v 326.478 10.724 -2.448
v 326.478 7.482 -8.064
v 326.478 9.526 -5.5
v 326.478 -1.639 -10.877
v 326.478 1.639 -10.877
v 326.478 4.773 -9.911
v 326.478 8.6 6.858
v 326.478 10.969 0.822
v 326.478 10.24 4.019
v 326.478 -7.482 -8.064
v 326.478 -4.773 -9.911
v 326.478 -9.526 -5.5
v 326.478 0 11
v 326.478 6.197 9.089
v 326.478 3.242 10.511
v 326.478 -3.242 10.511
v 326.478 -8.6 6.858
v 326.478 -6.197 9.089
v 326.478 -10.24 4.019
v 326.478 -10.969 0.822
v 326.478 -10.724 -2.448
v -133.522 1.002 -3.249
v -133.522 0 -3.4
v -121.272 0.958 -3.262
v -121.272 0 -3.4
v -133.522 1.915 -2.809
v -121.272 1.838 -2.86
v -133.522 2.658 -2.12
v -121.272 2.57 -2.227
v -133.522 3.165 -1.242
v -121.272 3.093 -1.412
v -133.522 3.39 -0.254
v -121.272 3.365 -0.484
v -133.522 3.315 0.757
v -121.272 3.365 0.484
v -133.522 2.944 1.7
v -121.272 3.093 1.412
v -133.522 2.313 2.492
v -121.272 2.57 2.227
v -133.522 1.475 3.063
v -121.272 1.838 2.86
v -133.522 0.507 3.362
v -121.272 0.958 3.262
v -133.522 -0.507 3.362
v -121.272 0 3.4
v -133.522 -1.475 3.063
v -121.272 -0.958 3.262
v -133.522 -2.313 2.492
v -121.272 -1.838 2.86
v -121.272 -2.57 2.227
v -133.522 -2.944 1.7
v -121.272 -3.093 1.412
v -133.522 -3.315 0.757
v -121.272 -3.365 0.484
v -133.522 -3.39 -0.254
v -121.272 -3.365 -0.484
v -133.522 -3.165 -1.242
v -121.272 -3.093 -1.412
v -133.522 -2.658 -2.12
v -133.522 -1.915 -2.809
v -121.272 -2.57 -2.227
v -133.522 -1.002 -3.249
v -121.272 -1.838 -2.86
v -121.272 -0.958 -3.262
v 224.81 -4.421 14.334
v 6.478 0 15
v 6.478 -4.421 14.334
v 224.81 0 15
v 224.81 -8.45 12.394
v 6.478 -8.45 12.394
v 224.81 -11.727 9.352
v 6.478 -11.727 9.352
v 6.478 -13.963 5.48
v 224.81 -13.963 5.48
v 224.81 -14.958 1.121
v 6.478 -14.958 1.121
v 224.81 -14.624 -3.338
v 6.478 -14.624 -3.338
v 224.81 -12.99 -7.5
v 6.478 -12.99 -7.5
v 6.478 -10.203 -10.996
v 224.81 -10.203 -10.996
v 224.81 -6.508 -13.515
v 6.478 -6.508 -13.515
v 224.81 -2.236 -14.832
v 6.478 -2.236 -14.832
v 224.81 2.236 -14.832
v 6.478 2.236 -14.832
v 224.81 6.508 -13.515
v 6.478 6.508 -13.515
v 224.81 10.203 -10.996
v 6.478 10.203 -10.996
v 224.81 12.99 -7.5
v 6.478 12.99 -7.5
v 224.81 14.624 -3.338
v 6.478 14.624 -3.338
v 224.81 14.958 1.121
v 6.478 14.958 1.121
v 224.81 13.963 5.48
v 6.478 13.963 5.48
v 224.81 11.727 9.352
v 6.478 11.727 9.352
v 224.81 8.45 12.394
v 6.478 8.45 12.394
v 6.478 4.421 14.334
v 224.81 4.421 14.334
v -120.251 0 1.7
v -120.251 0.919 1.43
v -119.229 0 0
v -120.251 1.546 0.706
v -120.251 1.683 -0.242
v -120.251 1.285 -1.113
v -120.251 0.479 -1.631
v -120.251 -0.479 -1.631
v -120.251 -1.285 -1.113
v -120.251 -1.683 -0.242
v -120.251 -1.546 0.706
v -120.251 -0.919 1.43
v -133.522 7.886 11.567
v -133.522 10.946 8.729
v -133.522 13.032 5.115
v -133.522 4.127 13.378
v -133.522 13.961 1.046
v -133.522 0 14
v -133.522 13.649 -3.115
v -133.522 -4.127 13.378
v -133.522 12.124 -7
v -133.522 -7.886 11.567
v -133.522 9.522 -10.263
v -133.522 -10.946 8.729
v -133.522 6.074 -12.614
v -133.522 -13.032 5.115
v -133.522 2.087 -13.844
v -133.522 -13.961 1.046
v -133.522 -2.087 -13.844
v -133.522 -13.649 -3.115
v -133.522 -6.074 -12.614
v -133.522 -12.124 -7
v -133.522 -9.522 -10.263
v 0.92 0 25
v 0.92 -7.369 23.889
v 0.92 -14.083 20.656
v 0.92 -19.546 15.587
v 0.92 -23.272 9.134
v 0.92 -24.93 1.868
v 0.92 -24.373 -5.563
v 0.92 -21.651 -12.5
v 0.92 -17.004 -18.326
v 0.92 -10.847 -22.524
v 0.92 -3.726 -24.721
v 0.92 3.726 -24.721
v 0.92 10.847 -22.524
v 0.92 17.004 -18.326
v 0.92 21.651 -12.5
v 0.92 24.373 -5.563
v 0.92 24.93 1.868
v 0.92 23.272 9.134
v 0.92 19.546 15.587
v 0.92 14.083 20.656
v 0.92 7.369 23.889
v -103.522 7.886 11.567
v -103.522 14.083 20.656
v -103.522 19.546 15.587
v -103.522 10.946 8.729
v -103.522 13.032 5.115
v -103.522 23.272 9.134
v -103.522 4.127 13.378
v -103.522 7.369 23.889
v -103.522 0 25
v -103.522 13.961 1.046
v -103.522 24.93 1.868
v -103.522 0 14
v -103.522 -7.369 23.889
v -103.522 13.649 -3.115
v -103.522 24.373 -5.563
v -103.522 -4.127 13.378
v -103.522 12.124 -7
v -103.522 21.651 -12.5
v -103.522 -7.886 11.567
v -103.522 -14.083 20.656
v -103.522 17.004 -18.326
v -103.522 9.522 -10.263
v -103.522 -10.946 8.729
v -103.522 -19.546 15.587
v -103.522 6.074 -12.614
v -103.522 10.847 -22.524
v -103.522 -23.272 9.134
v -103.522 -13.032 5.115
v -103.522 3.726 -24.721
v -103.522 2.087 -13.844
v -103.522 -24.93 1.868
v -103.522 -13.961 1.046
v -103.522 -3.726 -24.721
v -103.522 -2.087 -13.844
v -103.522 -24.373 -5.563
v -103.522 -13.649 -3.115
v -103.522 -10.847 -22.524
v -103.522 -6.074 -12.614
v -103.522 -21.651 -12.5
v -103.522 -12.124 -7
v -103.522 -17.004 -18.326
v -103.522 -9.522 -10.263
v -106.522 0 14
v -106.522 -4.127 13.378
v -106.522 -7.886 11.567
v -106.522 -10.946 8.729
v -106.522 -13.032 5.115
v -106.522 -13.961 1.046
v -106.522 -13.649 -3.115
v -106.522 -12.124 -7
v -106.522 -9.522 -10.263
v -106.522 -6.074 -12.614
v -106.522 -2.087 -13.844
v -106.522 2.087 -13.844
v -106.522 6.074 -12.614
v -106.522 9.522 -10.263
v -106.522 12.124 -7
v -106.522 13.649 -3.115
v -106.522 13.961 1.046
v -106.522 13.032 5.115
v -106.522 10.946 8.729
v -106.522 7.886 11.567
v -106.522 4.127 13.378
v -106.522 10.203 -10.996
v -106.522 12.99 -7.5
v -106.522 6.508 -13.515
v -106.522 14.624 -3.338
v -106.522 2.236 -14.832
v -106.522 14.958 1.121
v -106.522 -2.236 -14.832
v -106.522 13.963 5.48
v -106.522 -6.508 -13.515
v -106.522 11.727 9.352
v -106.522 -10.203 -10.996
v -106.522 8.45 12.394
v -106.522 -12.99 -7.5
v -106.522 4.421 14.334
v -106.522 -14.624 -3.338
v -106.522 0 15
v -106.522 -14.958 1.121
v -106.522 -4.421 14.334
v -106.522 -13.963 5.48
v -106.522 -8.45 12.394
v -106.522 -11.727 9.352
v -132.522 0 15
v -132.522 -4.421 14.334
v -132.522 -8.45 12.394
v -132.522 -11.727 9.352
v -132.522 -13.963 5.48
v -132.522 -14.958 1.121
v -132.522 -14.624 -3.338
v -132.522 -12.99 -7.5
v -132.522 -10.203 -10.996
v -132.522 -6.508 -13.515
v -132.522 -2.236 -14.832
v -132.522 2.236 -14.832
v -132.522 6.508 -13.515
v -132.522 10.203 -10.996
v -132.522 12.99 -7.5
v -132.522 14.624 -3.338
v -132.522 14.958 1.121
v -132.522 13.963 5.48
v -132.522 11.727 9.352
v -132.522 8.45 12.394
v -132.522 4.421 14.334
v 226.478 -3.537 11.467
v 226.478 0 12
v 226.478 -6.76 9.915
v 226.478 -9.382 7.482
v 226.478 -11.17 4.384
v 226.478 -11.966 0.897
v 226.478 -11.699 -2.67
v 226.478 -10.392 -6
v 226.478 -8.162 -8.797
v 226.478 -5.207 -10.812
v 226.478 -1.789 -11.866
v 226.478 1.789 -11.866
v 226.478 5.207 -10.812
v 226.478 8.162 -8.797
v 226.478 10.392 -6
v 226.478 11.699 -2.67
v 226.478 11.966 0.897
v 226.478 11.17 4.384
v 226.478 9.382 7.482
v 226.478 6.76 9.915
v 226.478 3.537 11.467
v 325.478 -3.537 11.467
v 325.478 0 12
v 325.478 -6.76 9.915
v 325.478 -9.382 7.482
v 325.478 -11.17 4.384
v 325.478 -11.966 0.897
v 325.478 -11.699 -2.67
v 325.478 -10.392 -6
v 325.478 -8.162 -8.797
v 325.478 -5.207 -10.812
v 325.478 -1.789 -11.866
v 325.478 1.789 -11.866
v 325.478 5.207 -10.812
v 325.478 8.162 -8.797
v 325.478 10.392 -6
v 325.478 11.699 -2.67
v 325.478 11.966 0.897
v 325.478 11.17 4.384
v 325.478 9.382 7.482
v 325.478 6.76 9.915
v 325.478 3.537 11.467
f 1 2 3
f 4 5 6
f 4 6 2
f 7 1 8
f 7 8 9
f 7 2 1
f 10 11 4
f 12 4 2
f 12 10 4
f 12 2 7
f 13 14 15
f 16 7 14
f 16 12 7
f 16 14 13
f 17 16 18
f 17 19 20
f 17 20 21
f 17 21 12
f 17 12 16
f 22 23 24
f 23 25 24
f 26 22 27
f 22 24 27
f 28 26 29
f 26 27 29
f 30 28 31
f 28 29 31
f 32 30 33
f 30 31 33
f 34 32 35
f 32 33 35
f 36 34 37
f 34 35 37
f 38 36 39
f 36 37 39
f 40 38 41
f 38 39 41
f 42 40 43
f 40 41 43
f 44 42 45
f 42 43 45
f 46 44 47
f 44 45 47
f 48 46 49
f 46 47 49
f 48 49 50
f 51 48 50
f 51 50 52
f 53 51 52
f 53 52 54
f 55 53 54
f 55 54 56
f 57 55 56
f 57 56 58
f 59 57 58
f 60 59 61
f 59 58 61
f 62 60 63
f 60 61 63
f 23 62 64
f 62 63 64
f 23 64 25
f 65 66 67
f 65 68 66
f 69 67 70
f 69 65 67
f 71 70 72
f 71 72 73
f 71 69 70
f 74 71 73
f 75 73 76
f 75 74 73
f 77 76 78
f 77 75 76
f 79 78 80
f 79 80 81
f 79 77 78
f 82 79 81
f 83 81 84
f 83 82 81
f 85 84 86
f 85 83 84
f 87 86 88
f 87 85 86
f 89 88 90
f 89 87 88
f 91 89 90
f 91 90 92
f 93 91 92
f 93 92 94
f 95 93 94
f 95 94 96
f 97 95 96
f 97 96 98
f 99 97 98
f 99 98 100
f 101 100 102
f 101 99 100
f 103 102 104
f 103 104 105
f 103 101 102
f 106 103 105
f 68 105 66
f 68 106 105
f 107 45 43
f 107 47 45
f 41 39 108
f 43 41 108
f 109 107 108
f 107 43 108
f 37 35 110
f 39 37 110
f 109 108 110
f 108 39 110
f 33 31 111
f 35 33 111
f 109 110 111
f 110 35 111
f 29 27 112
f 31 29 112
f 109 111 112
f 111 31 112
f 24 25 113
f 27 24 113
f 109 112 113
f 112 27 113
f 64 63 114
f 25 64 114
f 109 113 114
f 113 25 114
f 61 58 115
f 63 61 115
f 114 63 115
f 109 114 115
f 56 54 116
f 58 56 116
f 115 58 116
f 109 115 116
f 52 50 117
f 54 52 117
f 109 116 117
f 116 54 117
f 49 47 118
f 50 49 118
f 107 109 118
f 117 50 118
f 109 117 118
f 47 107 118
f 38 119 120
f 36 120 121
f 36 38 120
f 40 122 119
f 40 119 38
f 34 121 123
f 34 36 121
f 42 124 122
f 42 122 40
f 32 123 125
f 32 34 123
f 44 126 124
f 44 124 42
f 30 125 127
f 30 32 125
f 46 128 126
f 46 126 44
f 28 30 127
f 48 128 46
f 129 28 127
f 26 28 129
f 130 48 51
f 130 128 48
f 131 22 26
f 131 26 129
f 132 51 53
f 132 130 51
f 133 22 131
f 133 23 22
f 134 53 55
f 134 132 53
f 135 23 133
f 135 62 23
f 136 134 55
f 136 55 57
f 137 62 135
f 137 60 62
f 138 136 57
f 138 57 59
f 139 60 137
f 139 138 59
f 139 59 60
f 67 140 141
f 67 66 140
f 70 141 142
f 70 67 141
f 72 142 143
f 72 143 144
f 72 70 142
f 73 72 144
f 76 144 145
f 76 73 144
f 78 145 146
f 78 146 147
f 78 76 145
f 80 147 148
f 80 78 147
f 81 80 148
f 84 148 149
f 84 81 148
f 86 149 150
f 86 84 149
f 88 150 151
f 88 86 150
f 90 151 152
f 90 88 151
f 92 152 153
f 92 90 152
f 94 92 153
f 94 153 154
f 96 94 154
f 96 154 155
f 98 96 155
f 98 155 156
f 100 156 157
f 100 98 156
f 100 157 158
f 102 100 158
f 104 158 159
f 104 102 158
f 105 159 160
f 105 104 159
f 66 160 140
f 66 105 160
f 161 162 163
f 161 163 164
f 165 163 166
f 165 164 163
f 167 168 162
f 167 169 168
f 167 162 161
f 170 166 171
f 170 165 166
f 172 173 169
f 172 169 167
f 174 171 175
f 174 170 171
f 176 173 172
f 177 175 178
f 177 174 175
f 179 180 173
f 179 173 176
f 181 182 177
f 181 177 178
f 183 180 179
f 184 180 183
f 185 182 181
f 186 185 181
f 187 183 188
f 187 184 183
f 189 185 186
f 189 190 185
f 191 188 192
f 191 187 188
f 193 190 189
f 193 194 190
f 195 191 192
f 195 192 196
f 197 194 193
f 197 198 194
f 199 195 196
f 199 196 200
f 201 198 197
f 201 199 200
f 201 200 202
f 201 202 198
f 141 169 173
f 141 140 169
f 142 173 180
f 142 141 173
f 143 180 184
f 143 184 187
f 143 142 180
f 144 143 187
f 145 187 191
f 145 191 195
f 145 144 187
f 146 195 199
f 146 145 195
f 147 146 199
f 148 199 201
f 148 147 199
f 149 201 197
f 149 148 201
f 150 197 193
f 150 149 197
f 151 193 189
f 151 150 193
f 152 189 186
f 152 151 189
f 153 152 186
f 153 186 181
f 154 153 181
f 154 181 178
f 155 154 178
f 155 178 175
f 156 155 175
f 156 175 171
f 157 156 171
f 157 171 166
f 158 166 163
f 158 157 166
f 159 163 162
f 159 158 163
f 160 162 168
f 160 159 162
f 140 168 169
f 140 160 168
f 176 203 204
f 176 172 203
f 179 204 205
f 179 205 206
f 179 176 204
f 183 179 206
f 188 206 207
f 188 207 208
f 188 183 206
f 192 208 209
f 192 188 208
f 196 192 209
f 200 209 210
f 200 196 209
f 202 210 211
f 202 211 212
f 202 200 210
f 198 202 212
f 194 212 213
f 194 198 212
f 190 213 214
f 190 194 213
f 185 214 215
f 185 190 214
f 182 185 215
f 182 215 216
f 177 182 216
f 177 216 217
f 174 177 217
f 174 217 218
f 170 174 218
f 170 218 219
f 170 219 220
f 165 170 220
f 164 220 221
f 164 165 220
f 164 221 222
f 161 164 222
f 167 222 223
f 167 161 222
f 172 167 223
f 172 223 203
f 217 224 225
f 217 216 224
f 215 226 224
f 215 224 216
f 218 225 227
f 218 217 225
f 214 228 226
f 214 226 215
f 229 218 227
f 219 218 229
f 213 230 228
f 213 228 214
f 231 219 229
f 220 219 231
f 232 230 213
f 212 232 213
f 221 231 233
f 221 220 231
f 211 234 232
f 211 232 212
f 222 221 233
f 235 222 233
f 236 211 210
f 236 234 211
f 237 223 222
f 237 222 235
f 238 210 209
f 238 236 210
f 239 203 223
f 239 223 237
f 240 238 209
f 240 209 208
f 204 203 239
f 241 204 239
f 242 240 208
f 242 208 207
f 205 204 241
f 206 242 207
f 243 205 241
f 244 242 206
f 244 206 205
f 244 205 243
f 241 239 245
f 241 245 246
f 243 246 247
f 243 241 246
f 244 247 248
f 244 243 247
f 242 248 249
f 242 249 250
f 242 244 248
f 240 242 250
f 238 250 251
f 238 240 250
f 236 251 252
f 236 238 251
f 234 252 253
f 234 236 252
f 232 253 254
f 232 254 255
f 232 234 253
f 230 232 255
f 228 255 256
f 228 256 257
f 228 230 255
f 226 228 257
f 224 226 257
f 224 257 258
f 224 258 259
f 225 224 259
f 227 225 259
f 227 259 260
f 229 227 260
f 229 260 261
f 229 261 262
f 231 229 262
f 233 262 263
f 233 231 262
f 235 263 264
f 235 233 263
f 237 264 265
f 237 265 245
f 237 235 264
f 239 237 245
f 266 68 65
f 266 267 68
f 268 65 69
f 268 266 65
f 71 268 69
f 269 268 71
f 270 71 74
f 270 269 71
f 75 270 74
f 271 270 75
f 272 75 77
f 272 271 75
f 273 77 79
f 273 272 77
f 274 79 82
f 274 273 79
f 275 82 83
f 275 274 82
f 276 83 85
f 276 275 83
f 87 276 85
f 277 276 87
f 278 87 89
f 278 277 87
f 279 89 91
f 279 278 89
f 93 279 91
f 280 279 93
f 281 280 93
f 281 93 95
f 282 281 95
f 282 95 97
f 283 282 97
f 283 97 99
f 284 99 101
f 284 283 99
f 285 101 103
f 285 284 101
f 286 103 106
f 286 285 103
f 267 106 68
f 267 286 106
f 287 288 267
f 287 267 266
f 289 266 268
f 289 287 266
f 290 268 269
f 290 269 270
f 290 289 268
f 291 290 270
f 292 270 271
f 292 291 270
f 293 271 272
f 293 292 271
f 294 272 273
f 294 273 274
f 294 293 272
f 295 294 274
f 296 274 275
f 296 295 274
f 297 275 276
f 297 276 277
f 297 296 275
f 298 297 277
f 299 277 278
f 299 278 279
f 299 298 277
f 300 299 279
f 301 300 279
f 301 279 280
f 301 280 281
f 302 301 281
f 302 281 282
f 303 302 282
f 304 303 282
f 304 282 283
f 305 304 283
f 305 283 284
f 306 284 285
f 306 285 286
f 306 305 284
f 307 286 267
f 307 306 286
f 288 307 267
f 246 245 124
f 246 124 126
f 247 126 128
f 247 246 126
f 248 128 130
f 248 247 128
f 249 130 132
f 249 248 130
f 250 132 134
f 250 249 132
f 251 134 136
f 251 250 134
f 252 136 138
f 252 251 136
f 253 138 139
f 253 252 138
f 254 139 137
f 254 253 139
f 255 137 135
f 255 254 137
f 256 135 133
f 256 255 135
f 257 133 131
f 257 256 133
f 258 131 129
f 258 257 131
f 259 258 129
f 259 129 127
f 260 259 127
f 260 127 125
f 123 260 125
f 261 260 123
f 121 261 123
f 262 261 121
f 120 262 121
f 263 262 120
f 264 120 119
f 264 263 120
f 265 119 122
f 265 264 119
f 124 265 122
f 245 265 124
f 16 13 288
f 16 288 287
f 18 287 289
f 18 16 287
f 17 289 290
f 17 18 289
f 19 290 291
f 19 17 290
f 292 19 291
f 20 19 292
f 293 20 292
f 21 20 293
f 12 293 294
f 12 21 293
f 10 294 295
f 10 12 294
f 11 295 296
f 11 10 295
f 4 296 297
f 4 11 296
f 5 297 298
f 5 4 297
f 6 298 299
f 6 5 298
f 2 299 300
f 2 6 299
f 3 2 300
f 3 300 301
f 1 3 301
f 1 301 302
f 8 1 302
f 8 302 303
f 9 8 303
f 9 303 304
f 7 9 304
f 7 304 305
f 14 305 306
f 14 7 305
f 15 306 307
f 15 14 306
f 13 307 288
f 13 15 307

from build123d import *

# Parameters (mm, degrees)
OTW_R_GWINTOWANY_M81_D     = 6.8
OTW_R_GWINTOWANY_M81_DEPTH = 12.25
OTW_R_GWINTOWANY_M81_TIP   = 2.042926105
SFAZOWANIE1_SIZE           = 1
SFAZOWANIE2_SIZE           = 1


with BuildPart() as part:
    # Szkic1 → Obrót1 (revolve)
    with BuildSketch(Plane.XY, mode=Mode.PRIVATE) as obr_t1_sk:
        Polygon((-133.522258266, 0), (-133.522258266, 15), (-106.522258266, 15), (-106.522258266, 14), (-103.522258266, 14), (-103.522258266, 25), (0.919675372, 25), (6.477741734, 15), (224.810321825, 15), (226.477741734, 12), (326.477741734, 12), (326.477741734, 0), align=None)
    revolve(obr_t1_sk.sketch.rotate(Axis((-73.178837214, 0, 0), (1, 0, 0)), 90), axis=Axis((-73.178837214, 0, 0), (1, 0, 0)))

    # Otwór gwintowany M81
    with Locations(Plane.ZY.offset(133.522258266)):
        with Locations((0, 0)):
            Hole(OTW_R_GWINTOWANY_M81_D / 2, depth=OTW_R_GWINTOWANY_M81_DEPTH)
            with Locations((0, 0, -(OTW_R_GWINTOWANY_M81_DEPTH + OTW_R_GWINTOWANY_M81_TIP / 2))):  # 118° drill point
                Cone(0, OTW_R_GWINTOWANY_M81_D / 2, OTW_R_GWINTOWANY_M81_TIP, mode=Mode.SUBTRACT)

    # Sfazowanie1
    sfazowanie1_edges = [part.edges().sort_by_distance(p)[0] for p in [
        (-133.522258266, 0, -15),
    ]]
    chamfer(sfazowanie1_edges, length=SFAZOWANIE1_SIZE)

    # Sfazowanie2
    sfazowanie2_edges = [part.edges().sort_by_distance(p)[0] for p in [
        (326.477741734, 0, -12),
    ]]
    chamfer(sfazowanie2_edges, length=SFAZOWANIE2_SIZE)


solid = part.part
